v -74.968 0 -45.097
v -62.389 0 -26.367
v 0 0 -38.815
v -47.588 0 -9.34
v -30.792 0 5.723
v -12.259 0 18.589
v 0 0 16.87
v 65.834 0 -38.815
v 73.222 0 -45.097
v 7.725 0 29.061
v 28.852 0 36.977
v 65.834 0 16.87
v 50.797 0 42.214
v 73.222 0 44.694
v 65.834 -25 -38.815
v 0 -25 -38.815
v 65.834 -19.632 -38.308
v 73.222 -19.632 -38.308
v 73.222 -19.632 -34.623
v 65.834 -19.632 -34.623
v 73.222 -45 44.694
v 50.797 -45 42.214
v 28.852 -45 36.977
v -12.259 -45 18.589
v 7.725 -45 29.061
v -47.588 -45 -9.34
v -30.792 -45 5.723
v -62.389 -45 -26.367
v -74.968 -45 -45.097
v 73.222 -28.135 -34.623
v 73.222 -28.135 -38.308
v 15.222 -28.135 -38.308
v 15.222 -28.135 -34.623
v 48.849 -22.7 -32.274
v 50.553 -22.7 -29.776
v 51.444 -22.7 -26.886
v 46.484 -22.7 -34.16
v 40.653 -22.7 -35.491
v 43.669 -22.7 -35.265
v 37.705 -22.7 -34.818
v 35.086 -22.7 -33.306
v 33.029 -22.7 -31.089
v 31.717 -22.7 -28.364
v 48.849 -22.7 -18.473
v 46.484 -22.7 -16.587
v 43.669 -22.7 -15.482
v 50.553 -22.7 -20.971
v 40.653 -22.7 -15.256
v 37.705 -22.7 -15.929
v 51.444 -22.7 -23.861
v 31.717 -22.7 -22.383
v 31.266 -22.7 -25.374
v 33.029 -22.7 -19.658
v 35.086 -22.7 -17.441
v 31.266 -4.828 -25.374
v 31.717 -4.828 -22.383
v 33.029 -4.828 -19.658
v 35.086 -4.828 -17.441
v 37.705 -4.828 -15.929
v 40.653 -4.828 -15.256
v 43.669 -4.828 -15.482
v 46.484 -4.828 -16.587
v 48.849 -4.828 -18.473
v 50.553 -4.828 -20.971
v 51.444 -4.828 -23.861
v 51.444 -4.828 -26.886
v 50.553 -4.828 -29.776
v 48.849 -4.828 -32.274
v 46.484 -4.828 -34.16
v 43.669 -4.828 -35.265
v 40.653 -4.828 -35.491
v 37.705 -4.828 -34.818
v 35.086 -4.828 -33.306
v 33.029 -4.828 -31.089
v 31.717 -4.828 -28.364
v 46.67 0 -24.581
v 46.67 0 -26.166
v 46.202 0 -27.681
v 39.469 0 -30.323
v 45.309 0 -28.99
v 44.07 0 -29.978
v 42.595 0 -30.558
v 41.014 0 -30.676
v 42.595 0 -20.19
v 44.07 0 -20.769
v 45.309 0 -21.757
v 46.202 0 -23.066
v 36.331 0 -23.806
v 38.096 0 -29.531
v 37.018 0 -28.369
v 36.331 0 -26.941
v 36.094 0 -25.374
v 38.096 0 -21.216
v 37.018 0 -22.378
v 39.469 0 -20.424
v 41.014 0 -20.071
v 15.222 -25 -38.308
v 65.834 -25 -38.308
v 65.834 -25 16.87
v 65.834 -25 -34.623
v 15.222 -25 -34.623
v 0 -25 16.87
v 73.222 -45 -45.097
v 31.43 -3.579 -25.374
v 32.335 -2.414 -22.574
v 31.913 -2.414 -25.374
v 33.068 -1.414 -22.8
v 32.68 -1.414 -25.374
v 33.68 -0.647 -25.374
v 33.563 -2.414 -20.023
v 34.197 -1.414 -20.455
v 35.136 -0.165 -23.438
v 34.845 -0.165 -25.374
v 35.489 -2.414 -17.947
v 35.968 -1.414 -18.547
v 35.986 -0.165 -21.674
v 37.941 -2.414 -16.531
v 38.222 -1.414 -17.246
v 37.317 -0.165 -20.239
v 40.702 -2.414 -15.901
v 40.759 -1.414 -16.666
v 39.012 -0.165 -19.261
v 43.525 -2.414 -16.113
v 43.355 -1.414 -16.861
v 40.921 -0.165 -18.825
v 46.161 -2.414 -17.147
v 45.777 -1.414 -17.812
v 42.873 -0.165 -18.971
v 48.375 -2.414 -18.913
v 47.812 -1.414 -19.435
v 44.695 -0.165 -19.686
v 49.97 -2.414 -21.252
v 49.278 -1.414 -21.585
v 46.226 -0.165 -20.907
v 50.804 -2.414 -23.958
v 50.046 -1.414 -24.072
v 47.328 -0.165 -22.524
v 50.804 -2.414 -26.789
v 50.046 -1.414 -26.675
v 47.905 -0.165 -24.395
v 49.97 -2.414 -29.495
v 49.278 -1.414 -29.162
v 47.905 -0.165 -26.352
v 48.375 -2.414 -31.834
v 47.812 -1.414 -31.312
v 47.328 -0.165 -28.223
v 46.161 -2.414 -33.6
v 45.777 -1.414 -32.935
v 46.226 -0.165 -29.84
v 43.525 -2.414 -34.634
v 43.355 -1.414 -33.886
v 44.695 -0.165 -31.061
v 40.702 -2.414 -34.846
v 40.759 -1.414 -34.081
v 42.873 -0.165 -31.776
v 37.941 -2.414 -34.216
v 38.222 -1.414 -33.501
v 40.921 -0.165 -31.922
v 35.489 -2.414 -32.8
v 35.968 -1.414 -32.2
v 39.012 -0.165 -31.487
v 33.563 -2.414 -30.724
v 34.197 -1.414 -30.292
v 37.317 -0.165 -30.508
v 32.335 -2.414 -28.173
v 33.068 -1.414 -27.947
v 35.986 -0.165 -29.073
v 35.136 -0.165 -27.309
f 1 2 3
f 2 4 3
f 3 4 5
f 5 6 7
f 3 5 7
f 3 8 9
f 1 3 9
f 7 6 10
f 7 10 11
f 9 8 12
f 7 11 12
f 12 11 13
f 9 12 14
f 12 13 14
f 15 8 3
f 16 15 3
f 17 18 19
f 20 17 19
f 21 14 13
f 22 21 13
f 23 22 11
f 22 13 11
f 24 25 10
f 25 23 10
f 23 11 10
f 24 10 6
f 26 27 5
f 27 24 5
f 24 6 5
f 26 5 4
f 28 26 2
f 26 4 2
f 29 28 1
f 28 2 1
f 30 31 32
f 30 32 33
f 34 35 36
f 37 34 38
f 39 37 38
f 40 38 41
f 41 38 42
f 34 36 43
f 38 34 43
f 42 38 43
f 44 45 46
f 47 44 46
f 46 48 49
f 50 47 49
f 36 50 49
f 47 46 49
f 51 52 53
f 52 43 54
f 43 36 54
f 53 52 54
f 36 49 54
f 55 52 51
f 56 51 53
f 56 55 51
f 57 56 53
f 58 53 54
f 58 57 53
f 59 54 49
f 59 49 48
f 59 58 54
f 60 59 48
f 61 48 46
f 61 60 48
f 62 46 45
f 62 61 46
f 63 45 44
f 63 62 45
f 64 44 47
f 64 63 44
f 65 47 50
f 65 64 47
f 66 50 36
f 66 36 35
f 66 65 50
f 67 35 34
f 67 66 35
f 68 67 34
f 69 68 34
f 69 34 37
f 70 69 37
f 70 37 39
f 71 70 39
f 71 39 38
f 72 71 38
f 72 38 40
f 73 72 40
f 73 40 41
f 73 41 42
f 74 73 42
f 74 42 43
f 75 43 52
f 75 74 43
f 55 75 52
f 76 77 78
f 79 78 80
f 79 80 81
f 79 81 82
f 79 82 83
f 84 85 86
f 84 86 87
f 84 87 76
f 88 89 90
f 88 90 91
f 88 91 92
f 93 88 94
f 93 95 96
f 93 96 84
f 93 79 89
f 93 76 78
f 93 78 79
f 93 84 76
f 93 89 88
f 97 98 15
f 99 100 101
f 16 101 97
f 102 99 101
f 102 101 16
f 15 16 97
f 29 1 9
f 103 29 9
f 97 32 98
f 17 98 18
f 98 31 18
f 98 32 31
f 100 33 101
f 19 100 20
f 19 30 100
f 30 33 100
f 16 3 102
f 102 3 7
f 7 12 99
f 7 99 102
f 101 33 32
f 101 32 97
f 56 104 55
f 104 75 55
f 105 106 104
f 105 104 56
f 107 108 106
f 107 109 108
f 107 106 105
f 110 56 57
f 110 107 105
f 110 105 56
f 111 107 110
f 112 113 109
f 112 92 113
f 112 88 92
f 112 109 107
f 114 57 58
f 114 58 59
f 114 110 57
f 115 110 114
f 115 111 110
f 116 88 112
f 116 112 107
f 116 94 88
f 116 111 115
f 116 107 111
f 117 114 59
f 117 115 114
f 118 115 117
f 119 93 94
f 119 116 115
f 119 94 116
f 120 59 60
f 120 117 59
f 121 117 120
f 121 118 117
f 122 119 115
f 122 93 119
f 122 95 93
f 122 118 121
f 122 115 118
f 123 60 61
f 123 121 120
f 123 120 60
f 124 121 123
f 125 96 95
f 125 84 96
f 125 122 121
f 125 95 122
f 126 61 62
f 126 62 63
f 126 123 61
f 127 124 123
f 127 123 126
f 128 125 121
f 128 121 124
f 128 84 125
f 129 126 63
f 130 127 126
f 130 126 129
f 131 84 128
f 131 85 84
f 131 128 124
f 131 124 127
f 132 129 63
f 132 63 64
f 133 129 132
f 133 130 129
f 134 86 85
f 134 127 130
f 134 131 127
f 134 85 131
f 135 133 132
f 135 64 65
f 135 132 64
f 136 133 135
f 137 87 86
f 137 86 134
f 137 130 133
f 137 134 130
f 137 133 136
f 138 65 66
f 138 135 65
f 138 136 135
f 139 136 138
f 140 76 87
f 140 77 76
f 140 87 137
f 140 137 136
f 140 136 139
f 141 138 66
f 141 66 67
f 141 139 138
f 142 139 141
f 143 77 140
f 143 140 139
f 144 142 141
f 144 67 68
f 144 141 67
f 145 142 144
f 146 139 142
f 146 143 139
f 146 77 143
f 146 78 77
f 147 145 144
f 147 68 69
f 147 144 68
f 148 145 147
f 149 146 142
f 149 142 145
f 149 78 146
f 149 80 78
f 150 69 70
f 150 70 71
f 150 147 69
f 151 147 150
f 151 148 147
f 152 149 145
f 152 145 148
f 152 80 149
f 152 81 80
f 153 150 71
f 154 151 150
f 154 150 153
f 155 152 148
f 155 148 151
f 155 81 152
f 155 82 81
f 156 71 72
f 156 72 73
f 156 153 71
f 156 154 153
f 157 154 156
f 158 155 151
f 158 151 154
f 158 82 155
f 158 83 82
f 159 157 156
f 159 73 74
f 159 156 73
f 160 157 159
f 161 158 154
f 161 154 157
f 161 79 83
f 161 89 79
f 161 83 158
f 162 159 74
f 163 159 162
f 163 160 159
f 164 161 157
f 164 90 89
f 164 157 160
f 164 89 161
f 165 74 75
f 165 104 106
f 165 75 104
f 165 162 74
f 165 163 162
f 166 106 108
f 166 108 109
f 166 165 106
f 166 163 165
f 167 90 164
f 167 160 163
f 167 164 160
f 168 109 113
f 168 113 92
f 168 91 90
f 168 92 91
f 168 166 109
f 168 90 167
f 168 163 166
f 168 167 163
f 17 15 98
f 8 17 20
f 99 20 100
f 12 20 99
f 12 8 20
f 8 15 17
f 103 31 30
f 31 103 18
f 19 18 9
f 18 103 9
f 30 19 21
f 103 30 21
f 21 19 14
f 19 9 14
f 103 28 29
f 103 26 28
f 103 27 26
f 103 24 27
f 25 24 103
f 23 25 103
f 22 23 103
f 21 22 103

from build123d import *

# Parameters (mm, degrees)
F0_W        = 148.189663887
F0_H        = 89.999999851
F1_DEPTH    = 45
F2_T1_DEPTH = 829.5739384699
F3_W        = 65.8340826631
F3_H        = 55.6846577674
F4_DEPTH    = 25
F5_R        = 10.1457152629
F6_DEPTH    = 22.7
F7_R        = 4.8284271247
F8_W        = 8.5035674274
F8_H        = 3.6853440106
F9_DEPTH    = 58


# Not quite as in the source:
# - a fillet or chamfer that OpenCascade refuses, or shapes differently, is made with other operations: its cross-section is extruded or revolved along the edge and cut away or added


with BuildPart() as f1:
    # F0 (on Front) → F1 (new body)
    with BuildSketch(Plane.XZ):
        with Locations((-0.8728429675, -0.096982345)):
            Rectangle(F0_W, F0_H)
    extrude(amount=F1_DEPTH)

    # F2: fillet of radius 181.7902812467 on 1 edges, made by hand

    # F2_s2 → F2_t1 (cut)
    with BuildSketch(Plane.XZ.offset(-392.286969235)):
        with BuildLine():
            ThreePointArc((81.947112783, 44.9030175805), (-8.4993500697, 20.8059312193), (-74.967674911, -45.0969822705))
            Line((-74.967674911, -45.0969822705), (-74.967674911, 44.9030175805))
            Line((-74.967674911, 44.9030175805), (81.947112783, 44.9030175805))
        make_face()
    extrude(amount=F2_T1_DEPTH, mode=Mode.SUBTRACT)

    # F3 (on face) → F4 (cut)
    with BuildSketch(Plane(origin=(0, 0, 0), x_dir=(-1, 0, 0), z_dir=(0, 1, 0))):
        with Locations((-32.9170413315, -10.9723461792)):
            Rectangle(F3_W, F3_H)
    extrude(amount=-F4_DEPTH, mode=Mode.SUBTRACT)

    # F8 (on face) → F9 (cut)
    with BuildSketch(Plane.YZ.offset(73.221988976)):
        with Locations((-23.8832868636, -36.4655200392)):
            Rectangle(F8_W, F8_H)
    extrude(amount=-F9_DEPTH, mode=Mode.SUBTRACT)


with BuildPart() as f6:
    # F5 (on face) → F6 (new body)
    with BuildSketch(Plane(origin=(0, 0, 0), x_dir=(-1, 0, 0), z_dir=(0, 1, 0))):
        with Locations((-41.4116419852, -25.3735482693)):
            Circle(F5_R)
    extrude(amount=-F6_DEPTH)

    # F7
    f7_edges = [f6.edges().sort_by_distance(p)[0] for p in [
        (51.557357, 0, -25.373548),
    ]]
    fillet(f7_edges, radius=F7_R)


solid = Compound([f1.part, f6.part])
